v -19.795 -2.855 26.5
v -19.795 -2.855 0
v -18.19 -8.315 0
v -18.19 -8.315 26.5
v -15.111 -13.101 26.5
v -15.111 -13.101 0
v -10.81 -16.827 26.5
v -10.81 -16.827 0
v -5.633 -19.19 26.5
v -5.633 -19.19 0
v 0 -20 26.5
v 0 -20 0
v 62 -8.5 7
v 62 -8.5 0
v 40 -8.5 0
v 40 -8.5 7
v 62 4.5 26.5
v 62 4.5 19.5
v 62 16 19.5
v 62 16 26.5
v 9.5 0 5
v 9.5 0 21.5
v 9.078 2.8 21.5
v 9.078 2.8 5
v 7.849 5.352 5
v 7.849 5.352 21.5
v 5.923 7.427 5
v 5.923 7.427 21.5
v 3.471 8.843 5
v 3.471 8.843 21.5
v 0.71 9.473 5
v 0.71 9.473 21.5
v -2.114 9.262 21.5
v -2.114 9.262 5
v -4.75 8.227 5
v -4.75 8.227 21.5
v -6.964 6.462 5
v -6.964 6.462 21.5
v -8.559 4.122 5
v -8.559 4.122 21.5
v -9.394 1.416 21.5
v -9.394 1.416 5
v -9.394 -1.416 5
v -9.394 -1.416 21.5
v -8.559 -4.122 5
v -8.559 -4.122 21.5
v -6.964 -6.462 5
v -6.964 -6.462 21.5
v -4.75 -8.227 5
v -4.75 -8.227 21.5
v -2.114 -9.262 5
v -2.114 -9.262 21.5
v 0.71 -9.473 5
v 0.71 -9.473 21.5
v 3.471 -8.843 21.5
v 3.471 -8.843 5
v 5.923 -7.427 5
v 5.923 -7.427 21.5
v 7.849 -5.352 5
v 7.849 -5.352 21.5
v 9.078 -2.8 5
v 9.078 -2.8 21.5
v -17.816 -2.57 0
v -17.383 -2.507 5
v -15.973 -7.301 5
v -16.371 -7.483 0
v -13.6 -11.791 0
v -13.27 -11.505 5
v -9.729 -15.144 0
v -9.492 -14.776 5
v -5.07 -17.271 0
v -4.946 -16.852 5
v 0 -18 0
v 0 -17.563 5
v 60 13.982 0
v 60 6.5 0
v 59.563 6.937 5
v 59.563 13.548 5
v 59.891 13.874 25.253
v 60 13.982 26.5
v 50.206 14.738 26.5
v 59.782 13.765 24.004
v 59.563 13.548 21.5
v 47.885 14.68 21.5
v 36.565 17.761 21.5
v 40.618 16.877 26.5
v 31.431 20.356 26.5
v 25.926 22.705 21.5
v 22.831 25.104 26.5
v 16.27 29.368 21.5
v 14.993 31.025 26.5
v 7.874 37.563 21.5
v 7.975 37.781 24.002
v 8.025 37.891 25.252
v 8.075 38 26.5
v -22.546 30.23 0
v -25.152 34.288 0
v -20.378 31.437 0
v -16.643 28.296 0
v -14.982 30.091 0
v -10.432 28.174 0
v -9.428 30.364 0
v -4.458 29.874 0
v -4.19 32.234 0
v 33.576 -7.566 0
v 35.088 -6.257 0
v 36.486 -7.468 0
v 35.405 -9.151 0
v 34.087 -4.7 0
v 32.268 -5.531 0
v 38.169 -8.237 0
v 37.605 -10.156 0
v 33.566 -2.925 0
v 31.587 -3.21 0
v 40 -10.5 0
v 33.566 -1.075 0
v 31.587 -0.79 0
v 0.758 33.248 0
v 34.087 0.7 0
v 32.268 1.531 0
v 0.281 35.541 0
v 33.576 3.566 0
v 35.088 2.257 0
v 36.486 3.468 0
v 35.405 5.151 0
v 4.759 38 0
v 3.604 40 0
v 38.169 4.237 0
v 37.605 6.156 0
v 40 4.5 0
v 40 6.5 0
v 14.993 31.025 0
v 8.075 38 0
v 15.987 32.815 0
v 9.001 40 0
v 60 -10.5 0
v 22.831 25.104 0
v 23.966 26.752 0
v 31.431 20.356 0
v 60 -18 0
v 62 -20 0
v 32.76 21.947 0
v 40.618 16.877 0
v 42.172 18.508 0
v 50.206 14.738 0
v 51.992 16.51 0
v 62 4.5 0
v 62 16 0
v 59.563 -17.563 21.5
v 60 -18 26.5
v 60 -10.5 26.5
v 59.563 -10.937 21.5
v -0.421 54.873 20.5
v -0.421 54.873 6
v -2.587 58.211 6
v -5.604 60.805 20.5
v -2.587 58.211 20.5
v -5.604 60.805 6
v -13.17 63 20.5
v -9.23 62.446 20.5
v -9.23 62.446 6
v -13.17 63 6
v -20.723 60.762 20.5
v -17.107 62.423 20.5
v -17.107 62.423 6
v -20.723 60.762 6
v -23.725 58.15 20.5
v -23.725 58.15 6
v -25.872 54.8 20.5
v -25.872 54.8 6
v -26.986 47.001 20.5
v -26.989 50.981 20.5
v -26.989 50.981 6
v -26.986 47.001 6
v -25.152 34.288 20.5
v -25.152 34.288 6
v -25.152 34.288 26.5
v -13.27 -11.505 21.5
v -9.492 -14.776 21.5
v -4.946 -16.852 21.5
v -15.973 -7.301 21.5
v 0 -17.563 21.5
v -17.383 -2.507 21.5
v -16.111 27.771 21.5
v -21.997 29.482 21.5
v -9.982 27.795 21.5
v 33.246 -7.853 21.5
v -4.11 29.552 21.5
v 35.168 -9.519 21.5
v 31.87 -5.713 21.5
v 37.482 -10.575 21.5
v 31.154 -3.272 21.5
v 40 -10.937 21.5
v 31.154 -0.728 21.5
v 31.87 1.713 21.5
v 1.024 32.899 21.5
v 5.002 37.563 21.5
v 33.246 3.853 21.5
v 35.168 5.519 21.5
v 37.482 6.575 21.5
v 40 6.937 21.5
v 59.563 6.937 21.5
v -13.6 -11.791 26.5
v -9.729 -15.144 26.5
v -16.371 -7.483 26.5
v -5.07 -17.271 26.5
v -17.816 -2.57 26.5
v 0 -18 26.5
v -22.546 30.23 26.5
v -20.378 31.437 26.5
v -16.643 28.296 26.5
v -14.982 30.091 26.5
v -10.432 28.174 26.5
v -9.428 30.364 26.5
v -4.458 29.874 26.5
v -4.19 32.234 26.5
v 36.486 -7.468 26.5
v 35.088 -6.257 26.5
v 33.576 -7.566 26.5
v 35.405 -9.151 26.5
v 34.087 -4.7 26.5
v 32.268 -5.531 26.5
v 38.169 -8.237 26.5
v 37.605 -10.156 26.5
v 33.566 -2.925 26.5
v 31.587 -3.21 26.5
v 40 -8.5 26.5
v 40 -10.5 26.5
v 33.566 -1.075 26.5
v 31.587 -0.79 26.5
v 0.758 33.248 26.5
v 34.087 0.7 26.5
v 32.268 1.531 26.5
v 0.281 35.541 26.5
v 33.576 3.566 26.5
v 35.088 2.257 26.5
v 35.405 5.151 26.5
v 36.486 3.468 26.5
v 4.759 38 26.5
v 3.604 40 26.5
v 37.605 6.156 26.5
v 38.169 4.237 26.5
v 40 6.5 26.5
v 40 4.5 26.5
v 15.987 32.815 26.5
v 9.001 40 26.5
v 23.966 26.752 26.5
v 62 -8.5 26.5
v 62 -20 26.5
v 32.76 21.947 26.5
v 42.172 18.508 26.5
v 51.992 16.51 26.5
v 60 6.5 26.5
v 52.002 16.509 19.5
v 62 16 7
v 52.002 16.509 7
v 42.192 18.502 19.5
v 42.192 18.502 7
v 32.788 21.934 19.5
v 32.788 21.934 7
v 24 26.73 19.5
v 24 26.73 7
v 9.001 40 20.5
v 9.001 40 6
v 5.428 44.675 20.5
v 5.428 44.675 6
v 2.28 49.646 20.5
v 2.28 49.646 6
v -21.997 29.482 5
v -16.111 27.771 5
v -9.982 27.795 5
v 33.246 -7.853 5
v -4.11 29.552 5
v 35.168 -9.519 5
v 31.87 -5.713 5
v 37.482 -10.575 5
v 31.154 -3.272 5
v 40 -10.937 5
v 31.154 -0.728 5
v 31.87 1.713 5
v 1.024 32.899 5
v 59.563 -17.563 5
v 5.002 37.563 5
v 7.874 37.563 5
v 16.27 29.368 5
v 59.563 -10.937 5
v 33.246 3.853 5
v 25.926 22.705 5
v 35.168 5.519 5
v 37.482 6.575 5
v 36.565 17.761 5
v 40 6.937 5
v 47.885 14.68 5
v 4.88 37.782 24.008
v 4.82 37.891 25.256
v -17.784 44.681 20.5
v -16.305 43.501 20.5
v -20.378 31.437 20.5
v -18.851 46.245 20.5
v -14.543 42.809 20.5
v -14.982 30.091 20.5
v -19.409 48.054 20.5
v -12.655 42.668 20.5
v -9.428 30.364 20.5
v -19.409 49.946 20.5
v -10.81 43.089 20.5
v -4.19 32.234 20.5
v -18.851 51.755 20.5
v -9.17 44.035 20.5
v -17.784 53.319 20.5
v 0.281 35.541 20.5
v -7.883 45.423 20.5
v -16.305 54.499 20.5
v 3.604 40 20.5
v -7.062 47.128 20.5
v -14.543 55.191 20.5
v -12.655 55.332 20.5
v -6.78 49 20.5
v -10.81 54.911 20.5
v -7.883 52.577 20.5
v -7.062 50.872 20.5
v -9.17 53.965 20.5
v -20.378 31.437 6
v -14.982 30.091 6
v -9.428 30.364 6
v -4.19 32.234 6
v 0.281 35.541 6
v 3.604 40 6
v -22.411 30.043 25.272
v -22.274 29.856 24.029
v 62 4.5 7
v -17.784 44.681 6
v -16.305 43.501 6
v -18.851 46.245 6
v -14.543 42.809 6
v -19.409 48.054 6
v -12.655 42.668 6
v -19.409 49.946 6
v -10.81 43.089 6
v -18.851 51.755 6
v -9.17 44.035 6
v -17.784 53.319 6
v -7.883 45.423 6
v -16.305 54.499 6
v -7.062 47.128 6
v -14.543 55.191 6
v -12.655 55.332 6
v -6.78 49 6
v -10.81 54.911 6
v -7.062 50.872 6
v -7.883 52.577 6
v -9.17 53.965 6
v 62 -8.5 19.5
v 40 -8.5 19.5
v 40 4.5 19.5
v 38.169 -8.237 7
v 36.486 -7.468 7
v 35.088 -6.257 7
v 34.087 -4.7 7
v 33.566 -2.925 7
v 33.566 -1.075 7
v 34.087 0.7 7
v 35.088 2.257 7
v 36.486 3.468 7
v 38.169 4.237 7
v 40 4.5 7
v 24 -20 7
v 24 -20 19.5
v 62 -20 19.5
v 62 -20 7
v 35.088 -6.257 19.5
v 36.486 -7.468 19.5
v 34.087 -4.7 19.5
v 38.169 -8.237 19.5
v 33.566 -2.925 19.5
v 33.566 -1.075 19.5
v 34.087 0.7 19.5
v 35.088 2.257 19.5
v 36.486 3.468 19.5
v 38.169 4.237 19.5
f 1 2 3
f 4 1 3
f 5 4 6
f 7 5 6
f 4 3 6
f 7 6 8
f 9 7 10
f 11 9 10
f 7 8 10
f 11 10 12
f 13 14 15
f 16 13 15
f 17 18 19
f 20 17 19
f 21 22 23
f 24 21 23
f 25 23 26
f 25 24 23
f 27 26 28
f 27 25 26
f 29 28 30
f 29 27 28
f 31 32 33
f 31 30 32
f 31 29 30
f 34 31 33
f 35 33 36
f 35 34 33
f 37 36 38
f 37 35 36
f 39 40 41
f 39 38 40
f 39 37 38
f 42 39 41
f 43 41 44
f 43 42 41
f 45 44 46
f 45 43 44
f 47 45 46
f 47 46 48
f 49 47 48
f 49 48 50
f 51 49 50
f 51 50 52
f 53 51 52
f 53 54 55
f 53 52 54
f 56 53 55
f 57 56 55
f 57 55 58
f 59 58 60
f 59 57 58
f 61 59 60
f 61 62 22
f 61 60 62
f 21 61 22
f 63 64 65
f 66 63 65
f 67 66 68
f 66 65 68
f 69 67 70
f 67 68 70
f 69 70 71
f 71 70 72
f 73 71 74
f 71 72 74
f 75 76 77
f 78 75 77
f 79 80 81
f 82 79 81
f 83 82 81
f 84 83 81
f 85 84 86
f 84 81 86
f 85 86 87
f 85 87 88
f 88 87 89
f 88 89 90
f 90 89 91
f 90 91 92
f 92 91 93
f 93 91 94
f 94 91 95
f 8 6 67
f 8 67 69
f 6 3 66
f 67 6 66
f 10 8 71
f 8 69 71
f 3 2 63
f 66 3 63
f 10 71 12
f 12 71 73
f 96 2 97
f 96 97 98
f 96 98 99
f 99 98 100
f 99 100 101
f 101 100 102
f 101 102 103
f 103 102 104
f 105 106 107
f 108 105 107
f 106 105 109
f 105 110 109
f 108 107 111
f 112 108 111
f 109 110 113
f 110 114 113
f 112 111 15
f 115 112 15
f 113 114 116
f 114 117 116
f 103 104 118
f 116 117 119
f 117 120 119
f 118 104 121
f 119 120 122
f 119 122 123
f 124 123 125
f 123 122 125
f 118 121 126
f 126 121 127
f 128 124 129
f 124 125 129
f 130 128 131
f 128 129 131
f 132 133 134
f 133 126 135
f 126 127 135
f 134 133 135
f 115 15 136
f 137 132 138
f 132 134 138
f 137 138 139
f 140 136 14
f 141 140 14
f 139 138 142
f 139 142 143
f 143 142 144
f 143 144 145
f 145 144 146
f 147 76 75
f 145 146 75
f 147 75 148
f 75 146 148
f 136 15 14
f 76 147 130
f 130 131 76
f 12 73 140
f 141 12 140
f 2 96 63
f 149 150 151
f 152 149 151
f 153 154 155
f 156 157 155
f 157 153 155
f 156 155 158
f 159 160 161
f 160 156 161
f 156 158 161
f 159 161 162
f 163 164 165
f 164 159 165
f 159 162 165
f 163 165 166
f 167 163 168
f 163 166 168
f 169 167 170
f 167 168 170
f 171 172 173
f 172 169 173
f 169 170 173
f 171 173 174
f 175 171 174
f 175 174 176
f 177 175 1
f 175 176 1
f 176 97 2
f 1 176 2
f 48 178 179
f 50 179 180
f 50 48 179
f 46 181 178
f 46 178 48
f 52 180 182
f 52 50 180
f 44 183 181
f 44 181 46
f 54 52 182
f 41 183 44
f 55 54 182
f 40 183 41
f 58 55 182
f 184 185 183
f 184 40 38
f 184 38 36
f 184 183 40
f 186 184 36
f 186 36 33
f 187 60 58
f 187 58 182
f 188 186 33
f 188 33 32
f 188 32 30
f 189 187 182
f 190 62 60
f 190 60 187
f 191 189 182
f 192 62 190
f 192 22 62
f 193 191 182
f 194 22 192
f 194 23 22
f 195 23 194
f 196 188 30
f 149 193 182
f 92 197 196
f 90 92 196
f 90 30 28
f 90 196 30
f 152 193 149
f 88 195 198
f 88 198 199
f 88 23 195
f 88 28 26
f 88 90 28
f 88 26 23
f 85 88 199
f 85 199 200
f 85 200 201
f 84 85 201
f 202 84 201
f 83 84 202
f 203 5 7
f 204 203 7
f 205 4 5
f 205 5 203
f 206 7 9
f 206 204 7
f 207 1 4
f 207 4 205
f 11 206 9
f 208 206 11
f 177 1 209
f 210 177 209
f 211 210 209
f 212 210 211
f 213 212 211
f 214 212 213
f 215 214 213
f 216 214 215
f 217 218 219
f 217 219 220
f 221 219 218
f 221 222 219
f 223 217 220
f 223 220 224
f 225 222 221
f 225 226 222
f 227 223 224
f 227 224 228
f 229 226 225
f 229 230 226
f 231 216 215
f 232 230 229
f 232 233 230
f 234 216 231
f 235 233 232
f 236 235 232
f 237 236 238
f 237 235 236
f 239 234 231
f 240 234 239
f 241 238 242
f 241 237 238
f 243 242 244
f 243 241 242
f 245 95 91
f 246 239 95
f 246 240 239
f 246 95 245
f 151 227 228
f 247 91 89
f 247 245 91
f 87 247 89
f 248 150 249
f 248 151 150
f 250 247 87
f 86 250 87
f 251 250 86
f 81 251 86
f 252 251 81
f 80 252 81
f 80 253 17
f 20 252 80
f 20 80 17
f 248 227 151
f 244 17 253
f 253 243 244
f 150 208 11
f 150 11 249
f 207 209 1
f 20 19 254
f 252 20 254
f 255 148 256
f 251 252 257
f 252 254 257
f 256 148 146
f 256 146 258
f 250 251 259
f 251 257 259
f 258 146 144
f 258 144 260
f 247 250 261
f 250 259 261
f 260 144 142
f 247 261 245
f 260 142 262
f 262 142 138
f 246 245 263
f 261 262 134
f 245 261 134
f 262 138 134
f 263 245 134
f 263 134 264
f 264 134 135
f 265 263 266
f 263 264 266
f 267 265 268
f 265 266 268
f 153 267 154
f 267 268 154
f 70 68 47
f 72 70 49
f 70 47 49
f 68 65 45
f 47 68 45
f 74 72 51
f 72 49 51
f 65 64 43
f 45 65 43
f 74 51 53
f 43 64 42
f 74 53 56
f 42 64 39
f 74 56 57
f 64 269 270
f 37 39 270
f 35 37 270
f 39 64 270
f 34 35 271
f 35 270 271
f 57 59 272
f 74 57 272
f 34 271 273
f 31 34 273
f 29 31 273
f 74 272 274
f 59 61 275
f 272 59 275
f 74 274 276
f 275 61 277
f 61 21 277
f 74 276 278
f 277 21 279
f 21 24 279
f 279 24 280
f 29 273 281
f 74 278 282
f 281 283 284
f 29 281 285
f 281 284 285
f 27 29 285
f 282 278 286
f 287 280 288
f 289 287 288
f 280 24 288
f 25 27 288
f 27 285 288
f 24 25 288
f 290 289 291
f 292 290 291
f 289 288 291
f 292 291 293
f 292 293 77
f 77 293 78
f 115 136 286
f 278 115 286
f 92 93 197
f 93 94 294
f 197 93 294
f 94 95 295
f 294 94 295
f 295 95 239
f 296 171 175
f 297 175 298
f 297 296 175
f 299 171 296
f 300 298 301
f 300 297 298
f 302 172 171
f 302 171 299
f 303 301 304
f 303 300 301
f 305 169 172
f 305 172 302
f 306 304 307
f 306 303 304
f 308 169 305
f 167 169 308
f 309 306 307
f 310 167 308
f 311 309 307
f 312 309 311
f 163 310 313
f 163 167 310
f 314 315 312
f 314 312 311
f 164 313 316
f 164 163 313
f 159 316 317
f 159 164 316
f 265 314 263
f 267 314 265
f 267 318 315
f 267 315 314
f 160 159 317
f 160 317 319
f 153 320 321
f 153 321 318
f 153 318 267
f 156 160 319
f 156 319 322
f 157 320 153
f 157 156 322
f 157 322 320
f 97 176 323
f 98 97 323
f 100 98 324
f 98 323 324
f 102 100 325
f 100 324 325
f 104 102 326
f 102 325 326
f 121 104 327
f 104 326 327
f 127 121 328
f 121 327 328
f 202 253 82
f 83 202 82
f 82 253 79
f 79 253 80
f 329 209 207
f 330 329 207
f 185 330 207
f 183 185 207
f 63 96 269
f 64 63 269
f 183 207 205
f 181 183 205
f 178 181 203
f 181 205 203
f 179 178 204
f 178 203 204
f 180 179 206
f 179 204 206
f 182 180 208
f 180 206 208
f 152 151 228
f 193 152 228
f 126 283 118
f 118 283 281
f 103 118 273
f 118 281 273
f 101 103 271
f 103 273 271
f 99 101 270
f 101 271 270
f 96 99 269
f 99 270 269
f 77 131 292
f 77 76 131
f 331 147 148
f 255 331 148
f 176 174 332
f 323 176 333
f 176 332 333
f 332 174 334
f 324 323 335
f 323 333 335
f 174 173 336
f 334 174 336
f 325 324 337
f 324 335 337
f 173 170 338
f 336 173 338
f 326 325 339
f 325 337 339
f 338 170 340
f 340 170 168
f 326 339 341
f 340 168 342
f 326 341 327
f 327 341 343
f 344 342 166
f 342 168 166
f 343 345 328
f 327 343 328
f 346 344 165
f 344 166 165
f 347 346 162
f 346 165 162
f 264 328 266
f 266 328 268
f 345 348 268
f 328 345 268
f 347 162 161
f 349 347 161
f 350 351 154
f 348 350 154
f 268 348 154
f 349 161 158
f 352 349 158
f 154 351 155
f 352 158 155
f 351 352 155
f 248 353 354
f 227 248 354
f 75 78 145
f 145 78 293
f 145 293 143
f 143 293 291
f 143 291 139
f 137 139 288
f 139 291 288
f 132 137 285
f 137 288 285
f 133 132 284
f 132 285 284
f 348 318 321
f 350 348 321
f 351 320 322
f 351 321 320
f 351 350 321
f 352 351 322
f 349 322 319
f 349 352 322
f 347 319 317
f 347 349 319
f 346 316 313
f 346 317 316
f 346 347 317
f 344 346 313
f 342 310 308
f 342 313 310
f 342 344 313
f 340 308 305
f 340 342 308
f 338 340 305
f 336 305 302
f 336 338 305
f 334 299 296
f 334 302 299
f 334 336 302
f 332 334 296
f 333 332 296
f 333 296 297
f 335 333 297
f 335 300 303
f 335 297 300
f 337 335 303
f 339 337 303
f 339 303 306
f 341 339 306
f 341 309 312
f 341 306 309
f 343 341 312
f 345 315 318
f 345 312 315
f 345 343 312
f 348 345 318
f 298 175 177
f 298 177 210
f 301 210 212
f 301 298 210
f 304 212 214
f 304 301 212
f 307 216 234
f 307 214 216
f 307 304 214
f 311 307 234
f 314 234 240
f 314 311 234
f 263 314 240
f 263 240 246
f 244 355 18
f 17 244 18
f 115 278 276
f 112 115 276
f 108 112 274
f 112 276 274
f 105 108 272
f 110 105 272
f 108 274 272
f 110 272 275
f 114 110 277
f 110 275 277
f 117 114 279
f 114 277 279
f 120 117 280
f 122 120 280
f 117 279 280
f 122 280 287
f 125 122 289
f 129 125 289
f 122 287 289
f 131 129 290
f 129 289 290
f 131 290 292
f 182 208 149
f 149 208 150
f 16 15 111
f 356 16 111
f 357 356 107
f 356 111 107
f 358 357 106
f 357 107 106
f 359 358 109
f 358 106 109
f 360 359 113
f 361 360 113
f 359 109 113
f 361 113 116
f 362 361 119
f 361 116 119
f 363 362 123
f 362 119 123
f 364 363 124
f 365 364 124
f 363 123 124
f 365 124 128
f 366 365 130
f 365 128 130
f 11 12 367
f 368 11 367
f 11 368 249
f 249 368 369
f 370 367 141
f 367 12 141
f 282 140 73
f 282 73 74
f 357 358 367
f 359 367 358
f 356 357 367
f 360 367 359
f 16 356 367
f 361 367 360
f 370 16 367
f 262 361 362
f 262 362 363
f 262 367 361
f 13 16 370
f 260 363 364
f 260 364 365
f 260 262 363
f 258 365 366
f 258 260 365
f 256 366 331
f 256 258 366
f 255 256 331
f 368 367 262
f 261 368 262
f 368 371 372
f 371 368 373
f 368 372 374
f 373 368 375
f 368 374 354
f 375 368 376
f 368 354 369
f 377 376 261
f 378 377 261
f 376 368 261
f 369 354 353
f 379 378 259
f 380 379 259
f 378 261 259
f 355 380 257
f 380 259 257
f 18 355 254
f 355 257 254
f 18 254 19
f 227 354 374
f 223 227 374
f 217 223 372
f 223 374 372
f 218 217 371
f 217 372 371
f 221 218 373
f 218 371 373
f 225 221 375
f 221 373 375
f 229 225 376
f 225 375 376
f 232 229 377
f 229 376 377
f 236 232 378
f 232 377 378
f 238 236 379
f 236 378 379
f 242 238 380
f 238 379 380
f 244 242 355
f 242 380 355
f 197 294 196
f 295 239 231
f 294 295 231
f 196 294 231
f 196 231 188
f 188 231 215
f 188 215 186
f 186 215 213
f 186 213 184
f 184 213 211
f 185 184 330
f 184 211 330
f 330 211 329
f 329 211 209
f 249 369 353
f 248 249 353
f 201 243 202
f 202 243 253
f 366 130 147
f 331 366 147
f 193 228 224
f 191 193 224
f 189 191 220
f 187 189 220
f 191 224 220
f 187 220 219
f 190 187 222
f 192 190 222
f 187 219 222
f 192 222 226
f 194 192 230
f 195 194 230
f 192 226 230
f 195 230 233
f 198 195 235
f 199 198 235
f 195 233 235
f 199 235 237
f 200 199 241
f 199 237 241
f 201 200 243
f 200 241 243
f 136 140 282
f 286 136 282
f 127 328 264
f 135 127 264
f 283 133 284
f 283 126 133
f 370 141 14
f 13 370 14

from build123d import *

# Parameters (mm, degrees)
SKETCH3_R               = 14
SKETCH3_R_2             = 6.35
SKETCH3_R_3             = 20
SKETCH3_R_4             = 9.5
BOSS_EXTRUDE6_DEPTH     = 26.5
CUT_EXTRUDE5_START      = 7
SKETCH7_W               = 38
SKETCH7_H               = 71.155333985
CUT_EXTRUDE5_DEPTH      = 12.5
CUT_EXTRUDE6_DEPTH      = 93.278112248
CUT_EXTRUDE6_DEPTH_BACK = 6
CUT_EXTRUDE8_DEPTH      = 93.278112248
CUT_EXTRUDE8_DEPTH_BACK = 6
CUT_EXTRUDE10_DEPTH     = 5
CUT_EXTRUDE10_TAPER     = 5
CUT_EXTRUDE11_DEPTH     = 5
CUT_EXTRUDE11_DRAFT     = -5


with BuildPart() as part:
    # Sketch3 → Boss-Extrude6 (new body)
    # profile 1 of 3: a face of its own
    with BuildSketch(Plane.XY):
        with BuildLine():
            ThreePointArc((0.870489571, 49), (-12.127650844, 35.035893248), (-26.986121482, 47.001417973))
            Line((-26.986121482, 47.001417973), (-19.795158647, -2.855117182))
            ThreePointArc((-19.795158647, -2.855117182), (-1.431227978, 19.948723931), (20, 0))
            ThreePointArc((20, 0), (14.142135624, -14.142135624), (0, -20))
            Line((0, -20), (62, -20))
            Line((62, -20), (62, -8.5))
            Line((62, -8.5), (40, -8.5))
            ThreePointArc((40, -8.5), (33.5, -2), (40, 4.5))
            Line((40, 4.5), (62, 4.5))
            Line((62, 4.5), (62, 16))
            ThreePointArc((62, 16), (24.979840385, 26.107737846), (-0.421043253, 54.873232673))
            ThreePointArc((-0.421043253, 54.873232673), (0.543794593, 52.006780632), (0.870489571, 49))
        make_face()
    # profile 2 of 3: a face of its own
    with BuildSketch(Plane.XY):
        with Locations((-13.129510429, 49)):
            Circle(SKETCH3_R)
        with Locations((-13.129510429, 49)):
            Circle(SKETCH3_R_2, mode=Mode.SUBTRACT)
    # profile 3 of 3: a face of its own
    with BuildSketch(Plane.XY):
        Circle(SKETCH3_R_3)
        Circle(SKETCH3_R_4, mode=Mode.SUBTRACT)
    extrude(amount=BOSS_EXTRUDE6_DEPTH)

    # Sketch7 → Cut-Extrude5 (cut)
    with BuildSketch(Plane.XY.offset(CUT_EXTRUDE5_START)):
        with Locations((43, 15.577666993)):
            Rectangle(SKETCH7_W, SKETCH7_H)
    extrude(amount=CUT_EXTRUDE5_DEPTH, mode=Mode.SUBTRACT)

    # Sketch8 → Cut-Extrude6 (cut, two sides: drawn at the far end of the back side and taken through both)
    with BuildSketch(Plane.XY.offset(26.5).offset(-CUT_EXTRUDE6_DEPTH_BACK)):
        with BuildLine():
            Line((-191.908254211, 170.560932392), (-25.15238927, 34.287747135))
            ThreePointArc((-25.15238927, 34.287747135), (-9.427586496, 30.364127088), (3.603690102, 40))
            Line((3.603690102, 40), (9.001095845, 40))
            Line((9.001095845, 40), (224.356382551, 40))
            Line((224.356382551, 40), (353.256649812, 450.969973536))
            Line((353.256649812, 450.969973536), (-63.007986949, 581.530905928))
            Line((-63.007986949, 581.530905928), (-191.908254211, 170.560932392))
        make_face()
    extrude(amount=CUT_EXTRUDE6_DEPTH + CUT_EXTRUDE6_DEPTH_BACK, mode=Mode.SUBTRACT)

    # Sketch9 → Cut-Extrude8 (cut, two sides: drawn at the far end of the back side and taken through both)
    with BuildSketch(Plane(origin=(0, 0, 0), x_dir=(-1, 0, 0), z_dir=(0, 0, -1)).offset(-CUT_EXTRUDE8_DEPTH_BACK)):
        with BuildLine():
            Line((191.908254211, 170.560932392), (25.15238927, 34.287747135))
            ThreePointArc((25.15238927, 34.287747135), (9.427586496, 30.364127088), (-3.603690102, 40))
            Line((-3.603690102, 40), (-9.001095845, 40))
            Line((-9.001095845, 40), (-224.356382551, 40))
            Line((-224.356382551, 40), (-353.256649812, 450.969973536))
            Line((-353.256649812, 450.969973536), (63.007986949, 581.530905928))
            Line((63.007986949, 581.530905928), (191.908254211, 170.560932392))
        make_face()
    extrude(amount=CUT_EXTRUDE8_DEPTH + CUT_EXTRUDE8_DEPTH_BACK, mode=Mode.SUBTRACT)

    # Sketch11 → Cut-Extrude10 (cut)
    with BuildSketch(Plane.XY):
        with BuildLine():
            Line((8.074790236, 38), (4.759033391, 38))
            ThreePointArc((4.759033391, 38), (-7.381776563, 28.801892282), (-22.54639569, 30.229750349))
            Line((-22.54639569, 30.229750349), (-17.815642783, -2.569605464))
            ThreePointArc((-17.815642783, -2.569605464), (-11.784462263, -13.606118079), (0, -18))
            Line((0, -18), (60, -18))
            Line((60, -18), (60, -10.5))
            Line((60, -10.5), (40, -10.5))
            ThreePointArc((40, -10.5), (31.5, -2), (40, 6.5))
            Line((40, 6.5), (60, 6.5))
            Line((60, 6.5), (60, 13.981994332))
            ThreePointArc((60, 13.981994332), (31.430822369, 20.355773383), (8.074790236, 38))
        make_face()
    extrude(amount=CUT_EXTRUDE10_DEPTH, taper=CUT_EXTRUDE10_TAPER, mode=Mode.SUBTRACT)


with BuildPart() as cut_extrude11_tool:
    # Sketch12 → Cut-Extrude11 (with draft: the straight prism first)
    with BuildSketch(Plane.XY.offset(26.5)):
        with BuildLine():
            Line((8.074790236, 38), (4.759033391, 38))
            ThreePointArc((4.759033391, 38), (-7.381776563, 28.801892282), (-22.54639569, 30.229750349))
            Line((-22.54639569, 30.229750349), (-17.815642783, -2.569605464))
            ThreePointArc((-17.815642783, -2.569605464), (-11.784462263, -13.606118079), (0, -18))
            Line((0, -18), (60, -18))
            Line((60, -18), (60, -10.5))
            Line((60, -10.5), (40, -10.5))
            ThreePointArc((40, -10.5), (31.5, -2), (40, 6.5))
            Line((40, 6.5), (60, 6.5))
            Line((60, 6.5), (60, 13.981994332))
            ThreePointArc((60, 13.981994332), (31.430822369, 20.355773383), (8.074790236, 38))
        make_face()
    extrude(amount=-CUT_EXTRUDE11_DEPTH)
    # Cut-Extrude11: the draft: its side faces are tilted about the plane it starts from
    cut_extrude11_sides = [cut_extrude11_tool.faces().sort_by_distance(p)[0] for p in [
        (31.430822369, 20.355773383, 24),
        (6.416911814, 38, 24),
        (-7.381776563, 28.801892282, 24),
        (-20.181019237, 13.830072443, 24),
        (-11.784462263, -13.606118079, 24),
        (30, -18, 24),
        (60, -14.25, 24),
        (50, -10.5, 24),
        (31.5, -2, 24),
        (50, 6.5, 24),
        (60, 10.240997166, 24),
    ]]
    draft(cut_extrude11_sides, Plane.XY.offset(26.5), CUT_EXTRUDE11_DRAFT)


with BuildPart() as part_1:
    add(part.part)

    # Cut-Extrude11: cut by cut_extrude11_tool
    add(cut_extrude11_tool.part, mode=Mode.SUBTRACT)


solid = part_1.part
